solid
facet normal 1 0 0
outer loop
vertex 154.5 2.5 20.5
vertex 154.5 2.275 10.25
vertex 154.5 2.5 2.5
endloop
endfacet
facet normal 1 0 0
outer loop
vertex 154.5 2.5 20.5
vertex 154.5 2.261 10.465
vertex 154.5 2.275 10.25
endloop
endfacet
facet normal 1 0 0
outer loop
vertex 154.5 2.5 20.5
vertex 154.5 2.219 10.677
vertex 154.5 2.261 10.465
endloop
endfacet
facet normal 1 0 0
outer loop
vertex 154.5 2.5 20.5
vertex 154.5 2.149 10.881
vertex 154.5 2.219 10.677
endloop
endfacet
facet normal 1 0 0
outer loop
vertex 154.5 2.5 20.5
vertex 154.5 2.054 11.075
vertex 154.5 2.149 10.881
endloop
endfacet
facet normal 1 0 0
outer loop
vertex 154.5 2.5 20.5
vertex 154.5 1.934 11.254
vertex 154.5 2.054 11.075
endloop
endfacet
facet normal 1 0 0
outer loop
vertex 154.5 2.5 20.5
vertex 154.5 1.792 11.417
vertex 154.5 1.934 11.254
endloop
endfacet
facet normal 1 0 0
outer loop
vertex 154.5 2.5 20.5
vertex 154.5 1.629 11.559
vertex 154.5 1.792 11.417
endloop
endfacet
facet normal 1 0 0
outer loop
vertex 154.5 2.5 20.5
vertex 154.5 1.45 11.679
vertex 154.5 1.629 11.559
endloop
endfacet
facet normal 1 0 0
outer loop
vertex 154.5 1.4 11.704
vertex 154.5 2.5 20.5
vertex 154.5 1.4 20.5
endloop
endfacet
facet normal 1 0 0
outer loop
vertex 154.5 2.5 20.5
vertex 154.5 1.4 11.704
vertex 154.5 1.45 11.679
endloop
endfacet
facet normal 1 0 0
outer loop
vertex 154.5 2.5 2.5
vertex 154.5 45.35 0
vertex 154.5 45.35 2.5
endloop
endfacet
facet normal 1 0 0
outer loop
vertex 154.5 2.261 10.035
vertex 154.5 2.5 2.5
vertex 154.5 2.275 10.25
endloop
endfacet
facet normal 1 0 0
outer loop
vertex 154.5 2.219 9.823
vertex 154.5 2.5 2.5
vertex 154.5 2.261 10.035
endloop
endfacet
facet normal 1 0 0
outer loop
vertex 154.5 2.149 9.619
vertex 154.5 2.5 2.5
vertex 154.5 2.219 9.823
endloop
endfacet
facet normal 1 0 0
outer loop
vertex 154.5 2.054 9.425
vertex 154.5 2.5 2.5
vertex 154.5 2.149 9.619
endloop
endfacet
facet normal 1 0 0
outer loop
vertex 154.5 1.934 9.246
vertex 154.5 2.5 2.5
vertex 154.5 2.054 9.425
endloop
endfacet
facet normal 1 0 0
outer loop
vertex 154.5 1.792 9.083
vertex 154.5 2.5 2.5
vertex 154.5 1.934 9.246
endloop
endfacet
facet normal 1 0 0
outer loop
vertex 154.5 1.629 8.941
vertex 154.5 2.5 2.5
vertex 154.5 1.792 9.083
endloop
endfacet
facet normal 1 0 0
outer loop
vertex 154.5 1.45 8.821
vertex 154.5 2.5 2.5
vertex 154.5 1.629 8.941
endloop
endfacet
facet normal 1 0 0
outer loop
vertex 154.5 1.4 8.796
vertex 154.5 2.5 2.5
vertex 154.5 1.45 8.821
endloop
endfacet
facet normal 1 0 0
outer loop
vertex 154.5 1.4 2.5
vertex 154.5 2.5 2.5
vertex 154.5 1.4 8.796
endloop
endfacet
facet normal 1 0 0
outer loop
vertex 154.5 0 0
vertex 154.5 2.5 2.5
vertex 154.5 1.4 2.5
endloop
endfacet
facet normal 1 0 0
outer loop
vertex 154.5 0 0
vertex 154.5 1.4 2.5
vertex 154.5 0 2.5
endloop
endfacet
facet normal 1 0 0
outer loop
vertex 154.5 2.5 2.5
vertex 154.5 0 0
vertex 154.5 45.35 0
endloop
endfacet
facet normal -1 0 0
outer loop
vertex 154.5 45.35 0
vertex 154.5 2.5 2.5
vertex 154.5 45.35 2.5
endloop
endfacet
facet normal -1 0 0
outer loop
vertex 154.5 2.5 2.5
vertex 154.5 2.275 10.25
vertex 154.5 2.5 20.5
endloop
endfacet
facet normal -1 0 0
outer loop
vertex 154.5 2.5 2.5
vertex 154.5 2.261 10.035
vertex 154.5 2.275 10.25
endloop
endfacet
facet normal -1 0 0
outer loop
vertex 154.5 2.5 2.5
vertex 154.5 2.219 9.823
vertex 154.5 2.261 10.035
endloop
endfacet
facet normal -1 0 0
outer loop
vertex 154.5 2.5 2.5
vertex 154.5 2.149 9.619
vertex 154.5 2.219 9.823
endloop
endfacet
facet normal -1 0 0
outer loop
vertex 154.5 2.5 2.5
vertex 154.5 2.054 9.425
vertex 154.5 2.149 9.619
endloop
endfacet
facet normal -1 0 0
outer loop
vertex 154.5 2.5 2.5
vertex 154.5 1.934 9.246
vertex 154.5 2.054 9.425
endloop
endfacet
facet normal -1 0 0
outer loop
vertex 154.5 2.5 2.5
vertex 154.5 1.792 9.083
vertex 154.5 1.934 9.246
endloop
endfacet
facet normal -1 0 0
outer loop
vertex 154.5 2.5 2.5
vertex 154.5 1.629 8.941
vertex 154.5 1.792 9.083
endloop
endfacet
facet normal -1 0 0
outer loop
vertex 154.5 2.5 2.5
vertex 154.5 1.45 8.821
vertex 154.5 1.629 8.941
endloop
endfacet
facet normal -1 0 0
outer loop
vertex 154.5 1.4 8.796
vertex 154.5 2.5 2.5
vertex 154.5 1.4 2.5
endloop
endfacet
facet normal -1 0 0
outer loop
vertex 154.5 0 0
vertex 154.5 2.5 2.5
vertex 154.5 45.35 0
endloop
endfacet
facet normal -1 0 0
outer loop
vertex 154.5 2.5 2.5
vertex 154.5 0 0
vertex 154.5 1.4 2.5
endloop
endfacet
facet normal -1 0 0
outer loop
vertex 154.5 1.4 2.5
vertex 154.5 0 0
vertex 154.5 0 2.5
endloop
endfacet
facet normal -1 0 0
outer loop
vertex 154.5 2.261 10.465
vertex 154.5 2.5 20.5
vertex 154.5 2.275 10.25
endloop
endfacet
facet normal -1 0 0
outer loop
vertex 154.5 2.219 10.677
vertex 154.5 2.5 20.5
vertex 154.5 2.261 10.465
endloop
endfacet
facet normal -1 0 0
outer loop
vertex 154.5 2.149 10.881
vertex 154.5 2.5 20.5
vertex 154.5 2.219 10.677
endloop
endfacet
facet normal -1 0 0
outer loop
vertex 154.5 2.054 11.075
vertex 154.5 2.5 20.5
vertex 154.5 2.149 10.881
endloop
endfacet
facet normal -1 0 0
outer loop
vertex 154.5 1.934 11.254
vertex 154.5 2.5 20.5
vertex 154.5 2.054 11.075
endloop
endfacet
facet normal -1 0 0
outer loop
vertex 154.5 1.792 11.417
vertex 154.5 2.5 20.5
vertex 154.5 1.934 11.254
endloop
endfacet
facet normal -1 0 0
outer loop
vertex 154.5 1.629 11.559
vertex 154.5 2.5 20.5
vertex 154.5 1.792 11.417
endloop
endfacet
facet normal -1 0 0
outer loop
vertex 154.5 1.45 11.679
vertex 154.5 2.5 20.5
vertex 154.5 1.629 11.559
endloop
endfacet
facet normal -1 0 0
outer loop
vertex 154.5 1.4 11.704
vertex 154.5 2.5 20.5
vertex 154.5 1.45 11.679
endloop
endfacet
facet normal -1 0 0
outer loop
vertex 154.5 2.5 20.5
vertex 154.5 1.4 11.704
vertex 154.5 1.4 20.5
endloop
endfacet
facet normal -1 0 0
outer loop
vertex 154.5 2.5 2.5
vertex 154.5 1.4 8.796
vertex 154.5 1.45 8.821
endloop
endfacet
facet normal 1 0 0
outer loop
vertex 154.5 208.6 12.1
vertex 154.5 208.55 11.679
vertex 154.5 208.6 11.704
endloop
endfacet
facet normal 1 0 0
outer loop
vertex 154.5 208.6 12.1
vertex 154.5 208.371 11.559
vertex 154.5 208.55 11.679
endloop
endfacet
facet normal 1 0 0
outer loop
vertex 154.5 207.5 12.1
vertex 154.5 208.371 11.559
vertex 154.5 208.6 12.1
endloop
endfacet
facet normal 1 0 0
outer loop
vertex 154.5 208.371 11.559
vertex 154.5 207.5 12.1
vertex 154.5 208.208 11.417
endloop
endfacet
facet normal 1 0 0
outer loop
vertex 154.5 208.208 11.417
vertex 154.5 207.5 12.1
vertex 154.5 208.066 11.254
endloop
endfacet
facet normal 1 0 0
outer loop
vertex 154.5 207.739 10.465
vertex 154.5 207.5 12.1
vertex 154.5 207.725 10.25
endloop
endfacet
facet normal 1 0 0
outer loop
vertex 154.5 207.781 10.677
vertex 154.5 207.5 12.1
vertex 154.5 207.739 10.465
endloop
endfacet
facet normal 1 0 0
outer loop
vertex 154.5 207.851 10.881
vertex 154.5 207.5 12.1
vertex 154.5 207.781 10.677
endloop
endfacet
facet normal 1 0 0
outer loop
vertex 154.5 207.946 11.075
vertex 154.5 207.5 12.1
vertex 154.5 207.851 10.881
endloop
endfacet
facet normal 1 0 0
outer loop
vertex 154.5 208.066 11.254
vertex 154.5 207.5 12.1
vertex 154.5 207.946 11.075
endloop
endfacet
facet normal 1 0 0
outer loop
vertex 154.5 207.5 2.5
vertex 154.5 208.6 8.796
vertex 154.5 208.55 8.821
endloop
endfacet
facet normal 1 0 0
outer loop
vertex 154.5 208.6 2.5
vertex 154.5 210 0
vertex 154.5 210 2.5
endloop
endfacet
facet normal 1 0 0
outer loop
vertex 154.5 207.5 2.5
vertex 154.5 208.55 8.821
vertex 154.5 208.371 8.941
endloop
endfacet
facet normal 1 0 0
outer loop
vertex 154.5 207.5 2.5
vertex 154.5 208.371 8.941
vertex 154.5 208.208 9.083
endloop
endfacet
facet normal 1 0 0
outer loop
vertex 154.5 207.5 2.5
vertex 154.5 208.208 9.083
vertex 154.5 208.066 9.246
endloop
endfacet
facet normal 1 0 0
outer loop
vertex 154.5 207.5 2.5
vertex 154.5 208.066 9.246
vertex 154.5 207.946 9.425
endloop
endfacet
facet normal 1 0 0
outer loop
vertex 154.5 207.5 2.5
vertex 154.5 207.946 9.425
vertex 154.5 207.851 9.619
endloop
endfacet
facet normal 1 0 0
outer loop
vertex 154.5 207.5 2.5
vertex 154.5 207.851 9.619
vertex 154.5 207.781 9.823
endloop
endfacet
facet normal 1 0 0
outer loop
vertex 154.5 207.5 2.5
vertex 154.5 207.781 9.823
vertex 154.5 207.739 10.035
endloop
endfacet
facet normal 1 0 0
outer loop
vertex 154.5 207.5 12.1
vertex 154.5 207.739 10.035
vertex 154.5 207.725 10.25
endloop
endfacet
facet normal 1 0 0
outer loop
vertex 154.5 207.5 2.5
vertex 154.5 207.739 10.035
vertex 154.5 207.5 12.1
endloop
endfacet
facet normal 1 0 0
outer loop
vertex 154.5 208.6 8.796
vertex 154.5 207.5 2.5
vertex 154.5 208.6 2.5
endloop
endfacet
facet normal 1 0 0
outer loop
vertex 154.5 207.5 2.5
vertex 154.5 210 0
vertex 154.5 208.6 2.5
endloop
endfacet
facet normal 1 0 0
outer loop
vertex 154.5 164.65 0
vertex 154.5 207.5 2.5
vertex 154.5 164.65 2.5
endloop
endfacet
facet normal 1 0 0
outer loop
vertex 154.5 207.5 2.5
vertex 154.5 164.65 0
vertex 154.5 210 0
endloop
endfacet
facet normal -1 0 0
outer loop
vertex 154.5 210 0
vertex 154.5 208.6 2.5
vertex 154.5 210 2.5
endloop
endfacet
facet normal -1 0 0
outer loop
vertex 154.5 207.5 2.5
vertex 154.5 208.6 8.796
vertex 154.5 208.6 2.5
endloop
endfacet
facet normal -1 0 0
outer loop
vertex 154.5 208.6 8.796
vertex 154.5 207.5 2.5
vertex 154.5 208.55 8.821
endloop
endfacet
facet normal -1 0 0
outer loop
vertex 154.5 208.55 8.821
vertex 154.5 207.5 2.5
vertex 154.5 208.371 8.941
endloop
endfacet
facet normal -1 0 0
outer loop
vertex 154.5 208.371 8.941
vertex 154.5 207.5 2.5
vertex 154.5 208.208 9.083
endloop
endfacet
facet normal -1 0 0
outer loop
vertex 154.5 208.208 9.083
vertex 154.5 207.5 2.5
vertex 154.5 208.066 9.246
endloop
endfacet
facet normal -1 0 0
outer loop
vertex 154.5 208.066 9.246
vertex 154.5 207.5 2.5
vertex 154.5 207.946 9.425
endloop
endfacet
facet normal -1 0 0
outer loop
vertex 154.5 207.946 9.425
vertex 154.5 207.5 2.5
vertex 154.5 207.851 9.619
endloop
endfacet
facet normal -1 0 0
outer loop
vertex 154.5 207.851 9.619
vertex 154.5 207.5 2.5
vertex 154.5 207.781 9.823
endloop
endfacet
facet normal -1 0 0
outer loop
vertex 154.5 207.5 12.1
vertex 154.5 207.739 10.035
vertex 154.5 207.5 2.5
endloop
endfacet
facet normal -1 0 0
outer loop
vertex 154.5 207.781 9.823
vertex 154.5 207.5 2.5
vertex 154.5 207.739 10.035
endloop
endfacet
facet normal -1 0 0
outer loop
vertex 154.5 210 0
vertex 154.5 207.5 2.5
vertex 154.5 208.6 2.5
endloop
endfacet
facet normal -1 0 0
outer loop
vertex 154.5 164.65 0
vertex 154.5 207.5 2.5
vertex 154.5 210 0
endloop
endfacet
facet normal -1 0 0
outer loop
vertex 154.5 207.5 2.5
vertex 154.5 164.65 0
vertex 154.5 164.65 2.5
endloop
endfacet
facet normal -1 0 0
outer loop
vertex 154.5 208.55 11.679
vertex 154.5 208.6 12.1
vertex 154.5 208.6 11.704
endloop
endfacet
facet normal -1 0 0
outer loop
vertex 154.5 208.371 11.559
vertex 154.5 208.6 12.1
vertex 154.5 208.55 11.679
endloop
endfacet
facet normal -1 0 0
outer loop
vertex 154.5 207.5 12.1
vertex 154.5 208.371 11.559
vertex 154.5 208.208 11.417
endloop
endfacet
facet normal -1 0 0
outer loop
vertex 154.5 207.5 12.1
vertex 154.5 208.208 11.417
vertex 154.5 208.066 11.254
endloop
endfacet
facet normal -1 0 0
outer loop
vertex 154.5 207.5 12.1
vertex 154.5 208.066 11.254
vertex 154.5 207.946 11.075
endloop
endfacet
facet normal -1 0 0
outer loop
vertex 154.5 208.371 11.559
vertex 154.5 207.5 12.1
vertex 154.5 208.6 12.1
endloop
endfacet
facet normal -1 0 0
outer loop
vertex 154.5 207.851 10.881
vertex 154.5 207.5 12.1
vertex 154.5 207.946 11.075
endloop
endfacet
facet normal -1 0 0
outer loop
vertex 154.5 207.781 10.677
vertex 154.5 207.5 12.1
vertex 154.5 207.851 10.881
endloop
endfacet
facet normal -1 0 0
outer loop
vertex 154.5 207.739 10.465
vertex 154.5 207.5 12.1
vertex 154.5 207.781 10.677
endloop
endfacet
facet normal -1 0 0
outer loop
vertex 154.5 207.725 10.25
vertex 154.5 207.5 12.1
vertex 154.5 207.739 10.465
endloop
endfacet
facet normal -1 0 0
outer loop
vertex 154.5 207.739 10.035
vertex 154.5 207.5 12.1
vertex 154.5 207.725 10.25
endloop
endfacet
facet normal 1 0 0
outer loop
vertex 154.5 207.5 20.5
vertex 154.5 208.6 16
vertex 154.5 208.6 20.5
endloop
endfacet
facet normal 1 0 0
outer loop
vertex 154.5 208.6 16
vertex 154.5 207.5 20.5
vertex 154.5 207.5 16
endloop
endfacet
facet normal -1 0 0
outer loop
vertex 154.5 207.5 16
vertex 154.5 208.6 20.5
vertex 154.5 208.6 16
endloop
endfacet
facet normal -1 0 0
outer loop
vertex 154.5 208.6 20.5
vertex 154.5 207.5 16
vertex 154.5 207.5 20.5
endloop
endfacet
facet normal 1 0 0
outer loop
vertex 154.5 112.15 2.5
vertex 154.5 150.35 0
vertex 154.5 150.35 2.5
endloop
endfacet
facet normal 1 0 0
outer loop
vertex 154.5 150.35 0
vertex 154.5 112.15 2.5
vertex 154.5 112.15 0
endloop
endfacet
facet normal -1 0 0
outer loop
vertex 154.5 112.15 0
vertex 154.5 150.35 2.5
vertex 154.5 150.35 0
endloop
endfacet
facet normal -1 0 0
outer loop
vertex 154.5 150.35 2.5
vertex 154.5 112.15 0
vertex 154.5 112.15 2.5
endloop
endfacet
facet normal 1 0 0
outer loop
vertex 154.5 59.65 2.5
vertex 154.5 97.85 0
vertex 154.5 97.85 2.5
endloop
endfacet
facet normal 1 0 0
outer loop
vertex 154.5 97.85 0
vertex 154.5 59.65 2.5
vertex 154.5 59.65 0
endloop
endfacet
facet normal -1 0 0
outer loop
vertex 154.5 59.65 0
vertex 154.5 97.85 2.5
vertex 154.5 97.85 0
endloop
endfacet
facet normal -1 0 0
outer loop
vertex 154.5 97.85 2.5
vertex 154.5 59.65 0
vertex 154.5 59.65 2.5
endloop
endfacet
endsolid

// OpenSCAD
// file: ../params.scad
/*
 * params.scad — every dimension the printed parts share, in millimetres.
 * ======================================================================
 * Included by all cad/*.scad files. No dimension may be duplicated in a part
 * file; if two parts need the same number, it lives here.
 *
 * Values marked MEASURE are design targets until caliper measurements of a real
 * X240 top section replace them (issue #44). Everything else is a design choice.
 */

// ---------------------------------------------------------------- deck / case
case_width  = 309.0;   // MEASURE  X, left to right, at the deck's mating surface
case_depth  = 210.0;   // MEASURE  Y, front (palmrest) to back
wall_t      = 2.5;     // PETG shell wall
corner_r    = 3.0;     // MEASURE  outer corner radius
internal_h  = 18.0;    // floor-to-deck clearance (see docs/enclosure/integration.md)
case_h      = internal_h + wall_t;

// Screw bosses that meet the X240 deck, from the front-left corner.  MEASURE all.
deck_boss_positions = [
    [  8.0,   8.0 ], [ 60.0,   8.0 ], [150.0,   8.0 ], [250.0,   8.0 ], [301.0,   8.0 ],
    [  8.0, 202.0 ], [150.0, 202.0 ], [301.0, 202.0 ],
];
boss_od = 6.0;
boss_id = 3.2;         // M2 heat-set insert hole (insert OD ~3.2 for a 3.5 mm body)

// ---------------------------------------------------------------- split joint
split      = true;     // print as two halves (fits a 220 mm bed); false = one piece
split_x    = case_width / 2;
tab_count  = 3;        // dovetail tabs along the floor seam
tab_w      = 14.0;     // tab width at the seam
tab_flare  = 3.0;      // extra width at the tip (dovetail angle)
tab_len    = 10.0;     // how far the tab reaches into the other half
joint_gap  = 0.15;     // clearance per face; tune with a 30 mm coupon
pin_d      = 3.0;      // alignment pins through the front/rear walls
pin_len    = 10.0;

// ---------------------------------------------------------------- board / sled
board_w    = 100.0;    // stripboard or Rev B PCB
board_d    = 80.0;
board_hole_inset = 4.0;                  // M2 holes this far from each board corner
board_hole_d     = 2.4;
sled_margin      = 6.0;                  // sled extends this far past the board
sled_t           = 2.0;
sled_standoff_h  = 6.0;                  // board sits this high above the sled
sled_standoff_od = 5.0;
// sled centre in the case (rear-centre; see docs/enclosure/integration.md)
sled_center = [ case_width / 2, case_depth - 8 - board_d / 2 - sled_margin - 6 ];
// sled-to-case bosses (around the sled, two per half so the sled bridges the seam)
sled_boss_offsets = [ [-56, -46], [56, -46], [-56, 46], [56, 46] ];

// ---------------------------------------------------------------- Pico
pico_w = 51.0;
pico_d = 21.0;
pico_h = 1.0;          // PCB thickness
pico_hole_d = 2.1;     // Pico mounting holes, 11.4 x 47 mm pattern
pico_hole_dx = 47.0;
pico_hole_dy = 11.4;

// ---------------------------------------------------------------- USB
usb_c     = false;                     // false = Micro-USB cutout, true = USB-C
usb_w     = usb_c ? 9.5 : 8.5;
usb_h     = usb_c ? 4.0 : 3.5;
usb_x     = sled_center[0];            // cutout centred on the board
usb_z     = wall_t + sled_t + sled_standoff_h + 1.6;   // bottom of the Pico's connector
cable_d   = 4.5;                       // USB cable jacket diameter
relief_w  = 22.0;                      // strain-relief bezel footprint
relief_d  = 12.0;
relief_h  = 10.0;

// ---------------------------------------------------------------- FPC
fpc_w        = 22.0;   // 40-pin 0.5 mm cable width
fpc_t        = 0.3;
fpc_min_r    = 5.0;    // minimum bend radius
clickpad_fpc_w = 8.0;  // MEASURE  ClickPad cable width
zif_body_w   = 26.0;   // 40-pin ZIF connector body length along the cable edge
zif_body_d   = 6.0;
zif_body_h   = 5.0;
zif_cp_body_w = 12.0;  // ClickPad ZIF body (pin count from probing)

// ---------------------------------------------------------------- gasket, vents, feet
gasket_depth = 1.2;
gasket_width = 2.0;
vents        = false;  // not thermally needed (docs/enclosure/durability.md)
vent_w = 40.0; vent_h = 2.0; vent_count = 4; vent_spacing = 6.0;
ribs         = true;   // two front-to-back stiffening ribs in the floor
rib_t        = 2.0;
rib_h        = 4.0;

foot_d       = 10.0;   // rubber feet, front
foot_recess  = 1.0;
foot_positions = [ [25, 20], [case_width - 25, 20] ];
tilt_positions = [ [25, case_depth - 20], [case_width - 25, case_depth - 20] ];
tilt_h       = 12.0;   // rear riser height
tilt_w       = 30.0;
tilt_d       = 20.0;
tilt_screw_d = 3.4;    // M3 clearance

// ---------------------------------------------------------------- LED light pipe
pipe_d       = 3.0;
pipe_flange_d= 5.0;
pipe_len     = internal_h - 2;
pipe_position = [ sled_center[0] + board_w / 2 + 15, sled_center[1] - 20 ];  // beside the touchpad

// ---------------------------------------------------------------- printing
fit      = 0.2;        // general hole clearance for printed-in-place fits
$fn      = 48;
// file: ../bottom_case.scad
/*
 * bottom_case.scad — X240 Pico keyboard bottom shell, printed as two halves
 * =========================================================================
 * The X240 top section (deck + palmrest) is the lid; this closes the assembly.
 * 309 x 210 mm exceeds every common print bed, so the shell splits at the
 * centre line with dovetail tabs in the floor, a half-lap on the front and rear
 * walls, and two alignment pins.  The perfboard sled screws across the seam and
 * is what makes the joined case stiff.
 *
 *   half = "left" | "right" | "both"     ("both" for a large-format printer)
 *
 * All dimensions come from params.scad.  Export:  F6, then File > Export > STL,
 * or ./dev build cad for every part at once.
 */
include <params.scad>

half = "left";

// ---------------------------------------------------------------- primitives
module rounded_box(w, d, h, r) {
    hull() for (x = [r, w - r], y = [r, d - r]) translate([x, y, 0]) cylinder(h = h, r = r);
}

module shell() {
    difference() {
        rounded_box(case_width, case_depth, case_h, corner_r);
        translate([wall_t, wall_t, wall_t])
            rounded_box(case_width - 2 * wall_t, case_depth - 2 * wall_t, case_h, max(0.1, corner_r - wall_t));
    }
}

module boss(x, y, h = case_h, od = boss_od, id = boss_id) {
    translate([x, y, 0]) difference() { cylinder(h = h, d = od); translate([0, 0, wall_t]) cylinder(h = h, d = id); }
}

module deck_bosses()  { for (p = deck_boss_positions) boss(p[0], p[1]); }
module sled_bosses()  { for (o = sled_boss_offsets) boss(sled_center[0] + o[0], sled_center[1] + o[1], wall_t + 4, 7, boss_id); }

module gasket_ledge() {
    translate([0, 0, case_h - gasket_depth]) difference() {
        rounded_box(case_width, case_depth, gasket_depth, corner_r);
        translate([gasket_width, gasket_width, -1])
            rounded_box(case_width - 2 * gasket_width, case_depth - 2 * gasket_width, gasket_depth + 2, max(0.1, corner_r - gasket_width));
    }
}

module stiffening_ribs() {
    if (ribs) for (x = [case_width * 0.25, case_width * 0.75])
        translate([x - rib_t / 2, wall_t, wall_t]) cube([rib_t, case_depth - 2 * wall_t, rib_h]);
}

// ---------------------------------------------------------------- cutouts
module usb_cutout() {
    translate([usb_x - usb_w / 2 - fit, case_depth - wall_t - 1, usb_z]) cube([usb_w + 2 * fit, wall_t + 2, usb_h + 2 * fit]);
}
module vent_slots() {
    if (vents) {
        sx = (case_width - vent_w) / 2; sy = case_depth / 2 - ((vent_count - 1) * vent_spacing) / 2;
        for (i = [0 : vent_count - 1]) translate([sx, sy + i * vent_spacing, -1]) cube([vent_w, vent_h, wall_t + 2]);
    }
}
module foot_recesses()   { for (p = foot_positions) translate([p[0], p[1], -1]) cylinder(h = foot_recess + 1, d = foot_d + fit); }
module tilt_screw_holes(){ for (p = tilt_positions) translate([p[0], p[1], -1]) cylinder(h = wall_t + 2, d = tilt_screw_d); }
module light_pipe_hole() { translate([pipe_position[0], pipe_position[1], -1]) cylinder(h = wall_t + 2, d = pipe_d + fit); }
module reset_hole()      { translate([sled_center[0] - 30, sled_center[1] + 30, -1]) cylinder(h = wall_t + 2, d = 3.2); }

// ---------------------------------------------------------------- split joint
// Dovetail tab profile in XY, extruded through the floor; the left half carries
// the tabs, the right half the pockets (pocket = tab grown by joint_gap).
module tab_profile(grow = 0) {
    w0 = tab_w + 2 * grow; w1 = tab_w + tab_flare + 2 * grow; l = tab_len + grow;
    polygon([[0, -w0 / 2], [l, -w1 / 2], [l, w1 / 2], [0, w0 / 2]]);
}
module floor_tabs(grow = 0) {
    for (i = [1 : tab_count])
        translate([split_x, case_depth * i / (tab_count + 1), 0])
            linear_extrude(wall_t) tab_profile(grow);
}
// Half-lap on the front and rear walls: the left wall's outer half continues past
// the seam; the right wall's outer half stops short by the same amount.
lap_len = 8;
module wall_lap(grow = 0) {
    for (y = [0, case_depth - wall_t / 2])
        translate([split_x - grow, y - grow, wall_t]) cube([lap_len + 2 * grow, wall_t / 2 + 2 * grow, case_h - wall_t + 1]);
}
module pins(grow = 0) {
    for (y = [wall_t / 4, case_depth - wall_t / 4])
        translate([split_x - pin_len / 2 - grow, y, case_h / 2]) rotate([0, 90, 0]) cylinder(h = pin_len + 2 * grow, d = pin_d + 2 * grow);
}

module whole_case() {
    difference() {
        union() { shell(); deck_bosses(); sled_bosses(); gasket_ledge(); stiffening_ribs(); }
        usb_cutout(); vent_slots(); foot_recesses(); tilt_screw_holes(); light_pipe_hole(); reset_hole();
    }
}

module left_half() {
    union() {
        difference() {
            intersection() { whole_case(); translate([-1, -1, -1]) cube([split_x + 1, case_depth + 2, case_h + 2]); }
            wall_lap(joint_gap);             // clear the lap pocket on the inner half...
            pins(joint_gap);
        }
        intersection() { whole_case(); floor_tabs(); }   // ...then add the tabs and lap tongue
        intersection() { whole_case(); wall_lap(); }
    }
}
module right_half() {
    difference() {
        intersection() { whole_case(); translate([split_x, -1, -1]) cube([case_width - split_x + 1, case_depth + 2, case_h + 2]); }
        floor_tabs(joint_gap);
        wall_lap(joint_gap);
        pins(joint_gap);
    }
}

if (!split || half == "both") whole_case();
else if (half == "left") left_half();
else right_half();
// main file
// Renders the overlap of the two case halves. A correct joint produces only the
// zero-thickness seam plane (X extent ~0); any real volume means interference.
// Checked by scripts/check_cad_joint.py via ./dev test.
use <../bottom_case.scad>
include <../params.scad>
intersection() { left_half(); right_half(); }
